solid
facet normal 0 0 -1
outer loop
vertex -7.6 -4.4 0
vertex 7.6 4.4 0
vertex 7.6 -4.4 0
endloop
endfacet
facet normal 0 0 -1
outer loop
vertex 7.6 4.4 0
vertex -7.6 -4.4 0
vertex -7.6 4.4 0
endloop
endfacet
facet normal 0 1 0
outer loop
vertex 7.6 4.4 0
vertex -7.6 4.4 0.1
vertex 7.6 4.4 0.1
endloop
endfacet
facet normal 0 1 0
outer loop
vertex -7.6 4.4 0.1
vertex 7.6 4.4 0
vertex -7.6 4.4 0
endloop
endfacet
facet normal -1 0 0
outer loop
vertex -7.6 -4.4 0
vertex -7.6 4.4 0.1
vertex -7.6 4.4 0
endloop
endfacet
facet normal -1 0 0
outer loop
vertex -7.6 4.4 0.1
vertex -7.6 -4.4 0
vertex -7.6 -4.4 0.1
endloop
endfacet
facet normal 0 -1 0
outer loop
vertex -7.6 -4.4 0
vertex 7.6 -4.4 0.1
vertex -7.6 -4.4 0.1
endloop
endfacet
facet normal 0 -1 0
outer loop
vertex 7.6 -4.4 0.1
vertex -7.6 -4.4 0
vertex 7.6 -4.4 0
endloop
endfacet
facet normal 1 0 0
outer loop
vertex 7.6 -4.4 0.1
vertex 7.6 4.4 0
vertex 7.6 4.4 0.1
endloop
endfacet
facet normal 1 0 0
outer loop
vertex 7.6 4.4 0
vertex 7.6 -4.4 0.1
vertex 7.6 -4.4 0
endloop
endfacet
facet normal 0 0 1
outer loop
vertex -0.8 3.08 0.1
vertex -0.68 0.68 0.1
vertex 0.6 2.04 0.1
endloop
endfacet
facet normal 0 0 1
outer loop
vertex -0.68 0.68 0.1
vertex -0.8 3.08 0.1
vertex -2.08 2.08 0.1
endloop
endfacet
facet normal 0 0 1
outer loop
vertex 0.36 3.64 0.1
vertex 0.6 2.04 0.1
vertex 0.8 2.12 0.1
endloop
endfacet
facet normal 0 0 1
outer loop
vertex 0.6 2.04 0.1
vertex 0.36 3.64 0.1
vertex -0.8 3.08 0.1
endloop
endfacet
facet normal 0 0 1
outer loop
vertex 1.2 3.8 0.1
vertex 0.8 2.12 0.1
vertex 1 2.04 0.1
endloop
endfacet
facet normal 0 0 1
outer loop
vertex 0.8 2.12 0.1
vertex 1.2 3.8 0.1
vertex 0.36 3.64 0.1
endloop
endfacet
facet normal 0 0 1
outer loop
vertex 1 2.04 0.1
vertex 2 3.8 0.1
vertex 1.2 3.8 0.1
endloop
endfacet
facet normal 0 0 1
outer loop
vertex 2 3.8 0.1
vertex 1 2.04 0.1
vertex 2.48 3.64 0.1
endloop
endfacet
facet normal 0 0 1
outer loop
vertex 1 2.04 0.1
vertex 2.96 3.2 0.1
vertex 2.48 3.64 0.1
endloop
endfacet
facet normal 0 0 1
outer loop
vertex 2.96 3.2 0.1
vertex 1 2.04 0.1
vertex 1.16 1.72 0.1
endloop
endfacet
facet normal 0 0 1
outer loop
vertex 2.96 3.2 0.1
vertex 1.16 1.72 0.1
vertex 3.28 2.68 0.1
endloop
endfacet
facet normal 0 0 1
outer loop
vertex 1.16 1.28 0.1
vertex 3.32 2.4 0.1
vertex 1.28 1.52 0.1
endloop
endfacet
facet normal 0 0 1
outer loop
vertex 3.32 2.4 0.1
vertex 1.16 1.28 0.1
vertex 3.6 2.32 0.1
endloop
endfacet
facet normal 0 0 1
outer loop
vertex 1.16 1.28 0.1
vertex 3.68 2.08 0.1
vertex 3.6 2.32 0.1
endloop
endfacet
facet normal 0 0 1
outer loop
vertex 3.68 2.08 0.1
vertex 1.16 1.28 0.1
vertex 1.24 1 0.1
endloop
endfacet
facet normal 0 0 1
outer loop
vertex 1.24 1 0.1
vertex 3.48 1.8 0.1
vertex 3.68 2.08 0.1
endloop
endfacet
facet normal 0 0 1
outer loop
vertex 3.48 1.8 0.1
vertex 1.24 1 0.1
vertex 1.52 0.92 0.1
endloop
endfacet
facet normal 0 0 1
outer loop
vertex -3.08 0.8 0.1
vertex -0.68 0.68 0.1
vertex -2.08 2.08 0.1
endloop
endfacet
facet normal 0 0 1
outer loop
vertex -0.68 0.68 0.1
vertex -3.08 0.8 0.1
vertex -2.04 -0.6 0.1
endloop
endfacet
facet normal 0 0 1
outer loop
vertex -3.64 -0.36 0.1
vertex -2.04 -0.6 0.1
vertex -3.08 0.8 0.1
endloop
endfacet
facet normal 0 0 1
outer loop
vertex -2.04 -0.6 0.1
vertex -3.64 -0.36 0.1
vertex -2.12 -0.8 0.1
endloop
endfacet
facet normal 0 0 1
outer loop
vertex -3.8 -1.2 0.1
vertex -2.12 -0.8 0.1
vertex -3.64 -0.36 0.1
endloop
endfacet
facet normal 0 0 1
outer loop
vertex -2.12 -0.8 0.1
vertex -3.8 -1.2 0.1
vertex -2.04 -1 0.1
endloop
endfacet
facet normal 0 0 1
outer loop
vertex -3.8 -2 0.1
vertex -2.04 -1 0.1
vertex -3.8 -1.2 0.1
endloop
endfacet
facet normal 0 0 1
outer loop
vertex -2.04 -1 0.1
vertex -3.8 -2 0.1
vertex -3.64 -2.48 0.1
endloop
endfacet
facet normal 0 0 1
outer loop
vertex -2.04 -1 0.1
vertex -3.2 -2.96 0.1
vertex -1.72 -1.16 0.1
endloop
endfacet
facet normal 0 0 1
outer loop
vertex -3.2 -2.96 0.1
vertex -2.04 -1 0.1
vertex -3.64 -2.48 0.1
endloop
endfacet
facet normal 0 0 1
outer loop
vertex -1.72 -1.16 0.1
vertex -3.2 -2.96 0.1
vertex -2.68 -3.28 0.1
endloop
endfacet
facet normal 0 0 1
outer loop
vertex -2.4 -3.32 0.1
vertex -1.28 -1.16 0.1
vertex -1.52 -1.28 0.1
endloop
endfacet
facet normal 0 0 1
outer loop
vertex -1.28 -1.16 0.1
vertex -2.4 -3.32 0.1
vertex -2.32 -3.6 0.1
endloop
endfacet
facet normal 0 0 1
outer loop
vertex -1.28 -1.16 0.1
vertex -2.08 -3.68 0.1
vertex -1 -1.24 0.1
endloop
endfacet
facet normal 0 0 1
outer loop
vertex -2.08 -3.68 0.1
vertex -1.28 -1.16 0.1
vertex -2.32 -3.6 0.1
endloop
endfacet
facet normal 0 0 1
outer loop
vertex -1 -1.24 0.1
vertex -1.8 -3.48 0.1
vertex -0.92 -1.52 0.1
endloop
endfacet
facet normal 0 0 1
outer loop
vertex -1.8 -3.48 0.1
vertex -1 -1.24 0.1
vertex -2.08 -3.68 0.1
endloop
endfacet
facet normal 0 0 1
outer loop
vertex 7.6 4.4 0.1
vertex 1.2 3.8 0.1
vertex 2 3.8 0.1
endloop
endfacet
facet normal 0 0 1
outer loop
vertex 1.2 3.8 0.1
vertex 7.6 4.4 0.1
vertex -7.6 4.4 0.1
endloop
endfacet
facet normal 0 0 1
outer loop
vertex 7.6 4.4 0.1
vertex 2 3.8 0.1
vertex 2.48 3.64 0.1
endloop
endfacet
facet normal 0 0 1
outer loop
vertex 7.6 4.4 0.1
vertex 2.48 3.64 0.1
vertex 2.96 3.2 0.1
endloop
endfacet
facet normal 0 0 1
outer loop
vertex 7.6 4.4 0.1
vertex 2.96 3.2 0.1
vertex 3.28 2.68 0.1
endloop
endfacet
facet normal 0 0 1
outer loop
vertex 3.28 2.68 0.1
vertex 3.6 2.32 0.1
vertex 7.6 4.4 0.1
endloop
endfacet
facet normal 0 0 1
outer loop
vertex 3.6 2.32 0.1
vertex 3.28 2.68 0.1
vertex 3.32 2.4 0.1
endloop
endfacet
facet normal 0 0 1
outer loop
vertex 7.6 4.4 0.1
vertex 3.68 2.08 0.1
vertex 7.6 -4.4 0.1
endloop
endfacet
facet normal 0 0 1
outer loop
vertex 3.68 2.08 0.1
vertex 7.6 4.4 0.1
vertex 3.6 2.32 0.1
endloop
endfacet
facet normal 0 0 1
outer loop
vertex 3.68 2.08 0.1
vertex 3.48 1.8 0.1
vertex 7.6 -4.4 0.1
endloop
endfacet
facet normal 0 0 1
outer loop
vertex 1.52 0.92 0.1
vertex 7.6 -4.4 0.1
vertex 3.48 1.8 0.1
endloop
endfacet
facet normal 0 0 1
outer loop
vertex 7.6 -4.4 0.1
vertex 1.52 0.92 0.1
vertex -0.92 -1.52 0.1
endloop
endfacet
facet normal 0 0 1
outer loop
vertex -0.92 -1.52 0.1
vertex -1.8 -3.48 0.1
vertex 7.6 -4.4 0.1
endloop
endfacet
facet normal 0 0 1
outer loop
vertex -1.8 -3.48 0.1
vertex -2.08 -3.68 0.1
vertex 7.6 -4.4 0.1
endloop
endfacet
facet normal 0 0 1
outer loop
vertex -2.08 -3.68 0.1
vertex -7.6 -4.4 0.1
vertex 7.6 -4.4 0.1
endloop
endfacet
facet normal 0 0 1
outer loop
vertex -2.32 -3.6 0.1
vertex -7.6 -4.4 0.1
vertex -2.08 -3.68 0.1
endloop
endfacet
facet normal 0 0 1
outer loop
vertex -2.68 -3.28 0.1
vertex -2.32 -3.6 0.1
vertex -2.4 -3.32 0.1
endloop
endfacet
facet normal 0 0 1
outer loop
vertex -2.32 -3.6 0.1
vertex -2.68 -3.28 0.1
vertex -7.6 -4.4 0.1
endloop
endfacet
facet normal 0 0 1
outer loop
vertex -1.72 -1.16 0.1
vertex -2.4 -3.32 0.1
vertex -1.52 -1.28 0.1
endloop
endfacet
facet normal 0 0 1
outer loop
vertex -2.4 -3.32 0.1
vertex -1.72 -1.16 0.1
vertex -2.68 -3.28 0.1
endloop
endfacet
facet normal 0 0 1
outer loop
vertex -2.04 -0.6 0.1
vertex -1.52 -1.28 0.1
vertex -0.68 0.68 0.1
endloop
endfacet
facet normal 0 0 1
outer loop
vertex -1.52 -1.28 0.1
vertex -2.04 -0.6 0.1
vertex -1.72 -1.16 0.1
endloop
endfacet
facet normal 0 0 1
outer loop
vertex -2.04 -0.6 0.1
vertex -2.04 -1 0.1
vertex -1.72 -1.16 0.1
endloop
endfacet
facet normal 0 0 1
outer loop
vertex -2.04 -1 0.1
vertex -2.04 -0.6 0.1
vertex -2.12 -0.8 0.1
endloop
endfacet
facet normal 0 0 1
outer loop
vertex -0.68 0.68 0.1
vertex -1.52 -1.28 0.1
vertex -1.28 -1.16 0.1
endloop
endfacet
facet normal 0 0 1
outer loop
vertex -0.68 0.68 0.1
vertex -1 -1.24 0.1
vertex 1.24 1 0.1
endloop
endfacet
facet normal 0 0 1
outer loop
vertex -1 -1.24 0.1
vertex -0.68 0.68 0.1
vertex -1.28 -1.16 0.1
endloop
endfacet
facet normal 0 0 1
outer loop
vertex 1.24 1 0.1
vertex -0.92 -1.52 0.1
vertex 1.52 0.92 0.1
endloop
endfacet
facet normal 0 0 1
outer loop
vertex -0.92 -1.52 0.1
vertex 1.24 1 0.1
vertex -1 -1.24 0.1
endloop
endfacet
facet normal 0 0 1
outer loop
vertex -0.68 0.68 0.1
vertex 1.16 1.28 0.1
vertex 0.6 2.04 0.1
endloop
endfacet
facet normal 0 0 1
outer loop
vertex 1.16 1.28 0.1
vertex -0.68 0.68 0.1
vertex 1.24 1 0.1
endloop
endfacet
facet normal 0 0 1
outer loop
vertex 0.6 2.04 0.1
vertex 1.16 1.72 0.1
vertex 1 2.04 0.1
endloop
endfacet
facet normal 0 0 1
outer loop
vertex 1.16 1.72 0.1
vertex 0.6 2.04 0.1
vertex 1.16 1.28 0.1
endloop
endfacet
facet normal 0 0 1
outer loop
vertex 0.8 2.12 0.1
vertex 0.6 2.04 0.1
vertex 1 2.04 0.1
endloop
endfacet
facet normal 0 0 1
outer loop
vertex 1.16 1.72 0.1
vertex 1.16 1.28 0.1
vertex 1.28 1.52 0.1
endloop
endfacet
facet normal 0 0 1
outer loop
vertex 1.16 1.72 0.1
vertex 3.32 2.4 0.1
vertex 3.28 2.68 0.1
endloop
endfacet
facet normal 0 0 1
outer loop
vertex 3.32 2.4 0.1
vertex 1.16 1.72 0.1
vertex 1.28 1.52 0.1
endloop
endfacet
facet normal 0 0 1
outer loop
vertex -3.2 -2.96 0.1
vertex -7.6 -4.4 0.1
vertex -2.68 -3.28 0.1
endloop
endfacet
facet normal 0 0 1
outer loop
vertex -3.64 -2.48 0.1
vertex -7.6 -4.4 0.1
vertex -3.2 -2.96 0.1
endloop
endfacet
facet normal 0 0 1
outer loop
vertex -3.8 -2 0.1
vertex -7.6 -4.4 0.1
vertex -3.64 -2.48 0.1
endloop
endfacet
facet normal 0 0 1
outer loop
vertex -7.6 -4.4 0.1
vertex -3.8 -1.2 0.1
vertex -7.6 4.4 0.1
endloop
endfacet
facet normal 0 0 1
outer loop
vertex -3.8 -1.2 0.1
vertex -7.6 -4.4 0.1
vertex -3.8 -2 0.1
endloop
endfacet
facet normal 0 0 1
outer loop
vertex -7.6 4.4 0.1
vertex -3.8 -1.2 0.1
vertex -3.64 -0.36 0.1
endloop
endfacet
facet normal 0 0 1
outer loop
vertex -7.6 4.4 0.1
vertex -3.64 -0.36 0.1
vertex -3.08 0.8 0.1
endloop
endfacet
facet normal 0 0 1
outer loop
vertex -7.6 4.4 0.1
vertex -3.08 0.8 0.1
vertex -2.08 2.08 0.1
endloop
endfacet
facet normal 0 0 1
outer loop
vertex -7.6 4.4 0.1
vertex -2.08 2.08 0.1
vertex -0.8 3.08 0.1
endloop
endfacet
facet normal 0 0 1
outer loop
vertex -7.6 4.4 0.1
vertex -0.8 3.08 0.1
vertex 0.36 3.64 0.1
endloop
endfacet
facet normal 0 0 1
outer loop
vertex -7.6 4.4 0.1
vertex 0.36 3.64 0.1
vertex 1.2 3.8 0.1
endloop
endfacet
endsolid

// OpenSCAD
// file: ../p/box5-12.scad
use <../lib.scad>
function ldraw_lib__box5_12() = [
// 0 Box with 5 Faces without Any Edges
// 0 Name: box5-12.dat
// 0 Author: Chris Dee [cwdee]
// 0 !LDRAW_ORG Primitive UPDATE 2009-02
// 0 !LICENSE Licensed under CC BY 2.0 and CC BY 4.0 : see CAreadme.txt
// 
// 0 BFC CERTIFY CCW
  [0,"BFC","CERTIFY"],
  [0,"BFC","CCW"],
// 
// 0 !HISTORY 2009-09-03 [PTadmin] Official Update 2009-02
// 
// 
// 4 16 1 1 1 1 1 -1 -1 1 -1 -1 1 1
  [4,16,1,1,1,1,1,-1,-1,1,-1,-1,1,1],
// 4 16 -1 0 1 1 0 1 1 1 1 -1 1 1
  [4,16,-1,0,1,1,0,1,1,1,1,-1,1,1],
// 4 16 -1 0 -1 -1 0 1 -1 1 1 -1 1 -1
  [4,16,-1,0,-1,-1,0,1,-1,1,1,-1,1,-1],
// 4 16 1 0 -1 -1 0 -1 -1 1 -1 1 1 -1
  [4,16,1,0,-1,-1,0,-1,-1,1,-1,1,1,-1],
// 4 16 1 0 1 1 0 -1 1 1 -1 1 1 1
  [4,16,1,0,1,1,0,-1,1,1,-1,1,1,1],
// 0
];
makepoly(ldraw_lib__box5_12(), line=0.2);
// main file
use <../lib.scad>
use <../p/box5-12.scad>
function ldraw_lib__164555f() = [
// 0 Sticker  1.1 x  1.9 with Black Telephone on Transparent Background
// 0 Name: 164555f.dat
// 0 Author: Takeshi Takahashi [RainbowDolphin]
// 0 !LDRAW_ORG Part UPDATE 2022-06
// 0 !LICENSE Licensed under CC BY 2.0 and CC BY 4.0 : see CAreadme.txt
// 
// 0 BFC CERTIFY CCW
  [0,"BFC","CERTIFY"],
  [0,"BFC","CCW"],
// 
// 0 !KEYWORDS Bricklink 4554stk01, Brickowl 156966, Rebrickable 164555, Set 4554
// 0 !KEYWORDS Station, Train
// 
// 0 !HISTORY 2022-12-20 [PTadmin] Official Update 2022-06
// 
// 
// 1 16 0 -0.25 0 19 0 0 0 0.25 0 0 0 11 box5-12.dat
  [1,16,0,-0.25,0,19,0,0,0,0.25,0,0,0,11, ldraw_lib__box5_12()],
// 0 BFC NOCLIP
  [0,"BFC","NOCLIP"],
// 4 0 -2 -0.25 7.7 -5.2 -0.25 5.2 -1.7 -0.25 1.7 1.5 -0.25 5.1
  [4,0,-2,-0.25,7.7,-5.2,-0.25,5.2,-1.7,-0.25,1.7,1.5,-0.25,5.1],
// 4 0 0.9 -0.25 9.1 -2 -0.25 7.7 1.5 -0.25 5.1 2 -0.25 5.3
  [4,0,0.9,-0.25,9.1,-2,-0.25,7.7,1.5,-0.25,5.1,2,-0.25,5.3],
// 4 0 3 -0.25 9.5 0.9 -0.25 9.1 2 -0.25 5.3 2.5 -0.25 5.1
  [4,0,3,-0.25,9.5,0.9,-0.25,9.1,2,-0.25,5.3,2.5,-0.25,5.1],
// 4 0 5 -0.25 9.5 3 -0.25 9.5 2.5 -0.25 5.1 6.2 -0.25 9.1
  [4,0,5,-0.25,9.5,3,-0.25,9.5,2.5,-0.25,5.1,6.2,-0.25,9.1],
// 4 0 6.2 -0.25 9.1 2.5 -0.25 5.1 2.9 -0.25 4.3 7.4 -0.25 8
  [4,0,6.2,-0.25,9.1,2.5,-0.25,5.1,2.9,-0.25,4.3,7.4,-0.25,8],
// 3 0 7.4 -0.25 8 2.9 -0.25 4.3 8.2 -0.25 6.7
  [3,0,7.4,-0.25,8,2.9,-0.25,4.3,8.2,-0.25,6.7],
// 4 0 9 -0.25 5.8 8.3 -0.25 6 3.2 -0.25 3.8 2.9 -0.25 3.2
  [4,0,9,-0.25,5.8,8.3,-0.25,6,3.2,-0.25,3.8,2.9,-0.25,3.2],
// 4 0 9.2 -0.25 5.2 9 -0.25 5.8 2.9 -0.25 3.2 3.1 -0.25 2.5
  [4,0,9.2,-0.25,5.2,9,-0.25,5.8,2.9,-0.25,3.2,3.1,-0.25,2.5],
// 4 0 9.2 -0.25 5.2 3.1 -0.25 2.5 3.8 -0.25 2.3 8.7 -0.25 4.5
  [4,0,9.2,-0.25,5.2,3.1,-0.25,2.5,3.8,-0.25,2.3,8.7,-0.25,4.5],
// 4 0 -1.7 -0.25 1.7 -5.2 -0.25 5.2 -7.7 -0.25 2 -5.1 -0.25 -1.5
  [4,0,-1.7,-0.25,1.7,-5.2,-0.25,5.2,-7.7,-0.25,2,-5.1,-0.25,-1.5],
// 4 0 -5.1 -0.25 -1.5 -7.7 -0.25 2 -9.1 -0.25 -0.9 -5.3 -0.25 -2
  [4,0,-5.1,-0.25,-1.5,-7.7,-0.25,2,-9.1,-0.25,-0.9,-5.3,-0.25,-2],
// 4 0 -5.3 -0.25 -2 -9.1 -0.25 -0.9 -9.5 -0.25 -3 -5.1 -0.25 -2.5
  [4,0,-5.3,-0.25,-2,-9.1,-0.25,-0.9,-9.5,-0.25,-3,-5.1,-0.25,-2.5],
// 4 0 -5.1 -0.25 -2.5 -9.5 -0.25 -3 -9.5 -0.25 -5 -9.1 -0.25 -6.2
  [4,0,-5.1,-0.25,-2.5,-9.5,-0.25,-3,-9.5,-0.25,-5,-9.1,-0.25,-6.2],
// 4 0 -4.3 -0.25 -2.9 -5.1 -0.25 -2.5 -9.1 -0.25 -6.2 -8 -0.25 -7.4
  [4,0,-4.3,-0.25,-2.9,-5.1,-0.25,-2.5,-9.1,-0.25,-6.2,-8,-0.25,-7.4],
// 3 0 -4.3 -0.25 -2.9 -8 -0.25 -7.4 -6.7 -0.25 -8.2
  [3,0,-4.3,-0.25,-2.9,-8,-0.25,-7.4,-6.7,-0.25,-8.2],
// 4 0 -3.8 -0.25 -3.2 -6 -0.25 -8.3 -5.8 -0.25 -9 -3.2 -0.25 -2.9
  [4,0,-3.8,-0.25,-3.2,-6,-0.25,-8.3,-5.8,-0.25,-9,-3.2,-0.25,-2.9],
// 4 0 -3.2 -0.25 -2.9 -5.8 -0.25 -9 -5.2 -0.25 -9.2 -2.5 -0.25 -3.1
  [4,0,-3.2,-0.25,-2.9,-5.8,-0.25,-9,-5.2,-0.25,-9.2,-2.5,-0.25,-3.1],
// 4 0 -2.3 -0.25 -3.8 -2.5 -0.25 -3.1 -5.2 -0.25 -9.2 -4.5 -0.25 -8.7
  [4,0,-2.3,-0.25,-3.8,-2.5,-0.25,-3.1,-5.2,-0.25,-9.2,-4.5,-0.25,-8.7],
// 0 BFC CLIP
  [0,"BFC","CLIP"],
// 4 16 19 -0.25 11 -19 -0.25 11 3 -0.25 9.5 5 -0.25 9.5
  [4,16,19,-0.25,11,-19,-0.25,11,3,-0.25,9.5,5,-0.25,9.5],
// 3 16 19 -0.25 11 5 -0.25 9.5 6.2 -0.25 9.1
  [3,16,19,-0.25,11,5,-0.25,9.5,6.2,-0.25,9.1],
// 3 16 19 -0.25 11 6.2 -0.25 9.1 7.4 -0.25 8
  [3,16,19,-0.25,11,6.2,-0.25,9.1,7.4,-0.25,8],
// 3 16 19 -0.25 11 7.4 -0.25 8 8.2 -0.25 6.7
  [3,16,19,-0.25,11,7.4,-0.25,8,8.2,-0.25,6.7],
// 4 16 19 -0.25 11 8.2 -0.25 6.7 8.3 -0.25 6 9 -0.25 5.8
  [4,16,19,-0.25,11,8.2,-0.25,6.7,8.3,-0.25,6,9,-0.25,5.8],
// 4 16 19 -0.25 11 9 -0.25 5.8 9.2 -0.25 5.2 19 -0.25 -11
  [4,16,19,-0.25,11,9,-0.25,5.8,9.2,-0.25,5.2,19,-0.25,-11],
// 3 16 9.2 -0.25 5.2 8.7 -0.25 4.5 19 -0.25 -11
  [3,16,9.2,-0.25,5.2,8.7,-0.25,4.5,19,-0.25,-11],
// 4 16 19 -0.25 -11 8.7 -0.25 4.5 3.8 -0.25 2.3 -2.3 -0.25 -3.8
  [4,16,19,-0.25,-11,8.7,-0.25,4.5,3.8,-0.25,2.3,-2.3,-0.25,-3.8],
// 3 16 -2.3 -0.25 -3.8 -4.5 -0.25 -8.7 19 -0.25 -11
  [3,16,-2.3,-0.25,-3.8,-4.5,-0.25,-8.7,19,-0.25,-11],
// 3 16 -4.5 -0.25 -8.7 -5.2 -0.25 -9.2 19 -0.25 -11
  [3,16,-4.5,-0.25,-8.7,-5.2,-0.25,-9.2,19,-0.25,-11],
// 3 16 -5.2 -0.25 -9.2 -19 -0.25 -11 19 -0.25 -11
  [3,16,-5.2,-0.25,-9.2,-19,-0.25,-11,19,-0.25,-11],
// 3 16 -5.8 -0.25 -9 -19 -0.25 -11 -5.2 -0.25 -9.2
  [3,16,-5.8,-0.25,-9,-19,-0.25,-11,-5.2,-0.25,-9.2],
// 4 16 -6.7 -0.25 -8.2 -19 -0.25 -11 -5.8 -0.25 -9 -6 -0.25 -8.3
  [4,16,-6.7,-0.25,-8.2,-19,-0.25,-11,-5.8,-0.25,-9,-6,-0.25,-8.3],
// 4 16 -4.3 -0.25 -2.9 -6.7 -0.25 -8.2 -6 -0.25 -8.3 -3.8 -0.25 -3.2
  [4,16,-4.3,-0.25,-2.9,-6.7,-0.25,-8.2,-6,-0.25,-8.3,-3.8,-0.25,-3.2],
// 4 16 -4.3 -0.25 -2.9 -3.8 -0.25 -3.2 -1.7 -0.25 1.7 -5.1 -0.25 -1.5
  [4,16,-4.3,-0.25,-2.9,-3.8,-0.25,-3.2,-1.7,-0.25,1.7,-5.1,-0.25,-1.5],
// 4 16 -5.1 -0.25 -2.5 -4.3 -0.25 -2.9 -5.1 -0.25 -1.5 -5.3 -0.25 -2
  [4,16,-5.1,-0.25,-2.5,-4.3,-0.25,-2.9,-5.1,-0.25,-1.5,-5.3,-0.25,-2],
// 3 16 -1.7 -0.25 1.7 -3.8 -0.25 -3.2 -3.2 -0.25 -2.9
  [3,16,-1.7,-0.25,1.7,-3.8,-0.25,-3.2,-3.2,-0.25,-2.9],
// 4 16 -1.7 -0.25 1.7 -3.2 -0.25 -2.9 -2.5 -0.25 -3.1 3.1 -0.25 2.5
  [4,16,-1.7,-0.25,1.7,-3.2,-0.25,-2.9,-2.5,-0.25,-3.1,3.1,-0.25,2.5],
// 4 16 3.1 -0.25 2.5 -2.5 -0.25 -3.1 -2.3 -0.25 -3.8 3.8 -0.25 2.3
  [4,16,3.1,-0.25,2.5,-2.5,-0.25,-3.1,-2.3,-0.25,-3.8,3.8,-0.25,2.3],
// 4 16 -1.7 -0.25 1.7 3.1 -0.25 2.5 2.9 -0.25 3.2 1.5 -0.25 5.1
  [4,16,-1.7,-0.25,1.7,3.1,-0.25,2.5,2.9,-0.25,3.2,1.5,-0.25,5.1],
// 4 16 1.5 -0.25 5.1 2.9 -0.25 3.2 2.9 -0.25 4.3 2.5 -0.25 5.1
  [4,16,1.5,-0.25,5.1,2.9,-0.25,3.2,2.9,-0.25,4.3,2.5,-0.25,5.1],
// 3 16 2 -0.25 5.3 1.5 -0.25 5.1 2.5 -0.25 5.1
  [3,16,2,-0.25,5.3,1.5,-0.25,5.1,2.5,-0.25,5.1],
// 3 16 2.9 -0.25 4.3 2.9 -0.25 3.2 3.2 -0.25 3.8
  [3,16,2.9,-0.25,4.3,2.9,-0.25,3.2,3.2,-0.25,3.8],
// 4 16 8.2 -0.25 6.7 2.9 -0.25 4.3 3.2 -0.25 3.8 8.3 -0.25 6
  [4,16,8.2,-0.25,6.7,2.9,-0.25,4.3,3.2,-0.25,3.8,8.3,-0.25,6],
// 3 16 -8 -0.25 -7.4 -19 -0.25 -11 -6.7 -0.25 -8.2
  [3,16,-8,-0.25,-7.4,-19,-0.25,-11,-6.7,-0.25,-8.2],
// 3 16 -9.1 -0.25 -6.2 -19 -0.25 -11 -8 -0.25 -7.4
  [3,16,-9.1,-0.25,-6.2,-19,-0.25,-11,-8,-0.25,-7.4],
// 3 16 -9.5 -0.25 -5 -19 -0.25 -11 -9.1 -0.25 -6.2
  [3,16,-9.5,-0.25,-5,-19,-0.25,-11,-9.1,-0.25,-6.2],
// 4 16 -19 -0.25 -11 -9.5 -0.25 -5 -9.5 -0.25 -3 -19 -0.25 11
  [4,16,-19,-0.25,-11,-9.5,-0.25,-5,-9.5,-0.25,-3,-19,-0.25,11],
// 3 16 -19 -0.25 11 -9.5 -0.25 -3 -9.1 -0.25 -0.9
  [3,16,-19,-0.25,11,-9.5,-0.25,-3,-9.1,-0.25,-0.9],
// 3 16 -19 -0.25 11 -9.1 -0.25 -0.9 -7.7 -0.25 2
  [3,16,-19,-0.25,11,-9.1,-0.25,-0.9,-7.7,-0.25,2],
// 3 16 -19 -0.25 11 -7.7 -0.25 2 -5.2 -0.25 5.2
  [3,16,-19,-0.25,11,-7.7,-0.25,2,-5.2,-0.25,5.2],
// 3 16 -19 -0.25 11 -5.2 -0.25 5.2 -2 -0.25 7.7
  [3,16,-19,-0.25,11,-5.2,-0.25,5.2,-2,-0.25,7.7],
// 3 16 -19 -0.25 11 -2 -0.25 7.7 0.9 -0.25 9.1
  [3,16,-19,-0.25,11,-2,-0.25,7.7,0.9,-0.25,9.1],
// 3 16 -19 -0.25 11 0.9 -0.25 9.1 3 -0.25 9.5
  [3,16,-19,-0.25,11,0.9,-0.25,9.1,3,-0.25,9.5],
];
makepoly(ldraw_lib__164555f(), line=0.2);
